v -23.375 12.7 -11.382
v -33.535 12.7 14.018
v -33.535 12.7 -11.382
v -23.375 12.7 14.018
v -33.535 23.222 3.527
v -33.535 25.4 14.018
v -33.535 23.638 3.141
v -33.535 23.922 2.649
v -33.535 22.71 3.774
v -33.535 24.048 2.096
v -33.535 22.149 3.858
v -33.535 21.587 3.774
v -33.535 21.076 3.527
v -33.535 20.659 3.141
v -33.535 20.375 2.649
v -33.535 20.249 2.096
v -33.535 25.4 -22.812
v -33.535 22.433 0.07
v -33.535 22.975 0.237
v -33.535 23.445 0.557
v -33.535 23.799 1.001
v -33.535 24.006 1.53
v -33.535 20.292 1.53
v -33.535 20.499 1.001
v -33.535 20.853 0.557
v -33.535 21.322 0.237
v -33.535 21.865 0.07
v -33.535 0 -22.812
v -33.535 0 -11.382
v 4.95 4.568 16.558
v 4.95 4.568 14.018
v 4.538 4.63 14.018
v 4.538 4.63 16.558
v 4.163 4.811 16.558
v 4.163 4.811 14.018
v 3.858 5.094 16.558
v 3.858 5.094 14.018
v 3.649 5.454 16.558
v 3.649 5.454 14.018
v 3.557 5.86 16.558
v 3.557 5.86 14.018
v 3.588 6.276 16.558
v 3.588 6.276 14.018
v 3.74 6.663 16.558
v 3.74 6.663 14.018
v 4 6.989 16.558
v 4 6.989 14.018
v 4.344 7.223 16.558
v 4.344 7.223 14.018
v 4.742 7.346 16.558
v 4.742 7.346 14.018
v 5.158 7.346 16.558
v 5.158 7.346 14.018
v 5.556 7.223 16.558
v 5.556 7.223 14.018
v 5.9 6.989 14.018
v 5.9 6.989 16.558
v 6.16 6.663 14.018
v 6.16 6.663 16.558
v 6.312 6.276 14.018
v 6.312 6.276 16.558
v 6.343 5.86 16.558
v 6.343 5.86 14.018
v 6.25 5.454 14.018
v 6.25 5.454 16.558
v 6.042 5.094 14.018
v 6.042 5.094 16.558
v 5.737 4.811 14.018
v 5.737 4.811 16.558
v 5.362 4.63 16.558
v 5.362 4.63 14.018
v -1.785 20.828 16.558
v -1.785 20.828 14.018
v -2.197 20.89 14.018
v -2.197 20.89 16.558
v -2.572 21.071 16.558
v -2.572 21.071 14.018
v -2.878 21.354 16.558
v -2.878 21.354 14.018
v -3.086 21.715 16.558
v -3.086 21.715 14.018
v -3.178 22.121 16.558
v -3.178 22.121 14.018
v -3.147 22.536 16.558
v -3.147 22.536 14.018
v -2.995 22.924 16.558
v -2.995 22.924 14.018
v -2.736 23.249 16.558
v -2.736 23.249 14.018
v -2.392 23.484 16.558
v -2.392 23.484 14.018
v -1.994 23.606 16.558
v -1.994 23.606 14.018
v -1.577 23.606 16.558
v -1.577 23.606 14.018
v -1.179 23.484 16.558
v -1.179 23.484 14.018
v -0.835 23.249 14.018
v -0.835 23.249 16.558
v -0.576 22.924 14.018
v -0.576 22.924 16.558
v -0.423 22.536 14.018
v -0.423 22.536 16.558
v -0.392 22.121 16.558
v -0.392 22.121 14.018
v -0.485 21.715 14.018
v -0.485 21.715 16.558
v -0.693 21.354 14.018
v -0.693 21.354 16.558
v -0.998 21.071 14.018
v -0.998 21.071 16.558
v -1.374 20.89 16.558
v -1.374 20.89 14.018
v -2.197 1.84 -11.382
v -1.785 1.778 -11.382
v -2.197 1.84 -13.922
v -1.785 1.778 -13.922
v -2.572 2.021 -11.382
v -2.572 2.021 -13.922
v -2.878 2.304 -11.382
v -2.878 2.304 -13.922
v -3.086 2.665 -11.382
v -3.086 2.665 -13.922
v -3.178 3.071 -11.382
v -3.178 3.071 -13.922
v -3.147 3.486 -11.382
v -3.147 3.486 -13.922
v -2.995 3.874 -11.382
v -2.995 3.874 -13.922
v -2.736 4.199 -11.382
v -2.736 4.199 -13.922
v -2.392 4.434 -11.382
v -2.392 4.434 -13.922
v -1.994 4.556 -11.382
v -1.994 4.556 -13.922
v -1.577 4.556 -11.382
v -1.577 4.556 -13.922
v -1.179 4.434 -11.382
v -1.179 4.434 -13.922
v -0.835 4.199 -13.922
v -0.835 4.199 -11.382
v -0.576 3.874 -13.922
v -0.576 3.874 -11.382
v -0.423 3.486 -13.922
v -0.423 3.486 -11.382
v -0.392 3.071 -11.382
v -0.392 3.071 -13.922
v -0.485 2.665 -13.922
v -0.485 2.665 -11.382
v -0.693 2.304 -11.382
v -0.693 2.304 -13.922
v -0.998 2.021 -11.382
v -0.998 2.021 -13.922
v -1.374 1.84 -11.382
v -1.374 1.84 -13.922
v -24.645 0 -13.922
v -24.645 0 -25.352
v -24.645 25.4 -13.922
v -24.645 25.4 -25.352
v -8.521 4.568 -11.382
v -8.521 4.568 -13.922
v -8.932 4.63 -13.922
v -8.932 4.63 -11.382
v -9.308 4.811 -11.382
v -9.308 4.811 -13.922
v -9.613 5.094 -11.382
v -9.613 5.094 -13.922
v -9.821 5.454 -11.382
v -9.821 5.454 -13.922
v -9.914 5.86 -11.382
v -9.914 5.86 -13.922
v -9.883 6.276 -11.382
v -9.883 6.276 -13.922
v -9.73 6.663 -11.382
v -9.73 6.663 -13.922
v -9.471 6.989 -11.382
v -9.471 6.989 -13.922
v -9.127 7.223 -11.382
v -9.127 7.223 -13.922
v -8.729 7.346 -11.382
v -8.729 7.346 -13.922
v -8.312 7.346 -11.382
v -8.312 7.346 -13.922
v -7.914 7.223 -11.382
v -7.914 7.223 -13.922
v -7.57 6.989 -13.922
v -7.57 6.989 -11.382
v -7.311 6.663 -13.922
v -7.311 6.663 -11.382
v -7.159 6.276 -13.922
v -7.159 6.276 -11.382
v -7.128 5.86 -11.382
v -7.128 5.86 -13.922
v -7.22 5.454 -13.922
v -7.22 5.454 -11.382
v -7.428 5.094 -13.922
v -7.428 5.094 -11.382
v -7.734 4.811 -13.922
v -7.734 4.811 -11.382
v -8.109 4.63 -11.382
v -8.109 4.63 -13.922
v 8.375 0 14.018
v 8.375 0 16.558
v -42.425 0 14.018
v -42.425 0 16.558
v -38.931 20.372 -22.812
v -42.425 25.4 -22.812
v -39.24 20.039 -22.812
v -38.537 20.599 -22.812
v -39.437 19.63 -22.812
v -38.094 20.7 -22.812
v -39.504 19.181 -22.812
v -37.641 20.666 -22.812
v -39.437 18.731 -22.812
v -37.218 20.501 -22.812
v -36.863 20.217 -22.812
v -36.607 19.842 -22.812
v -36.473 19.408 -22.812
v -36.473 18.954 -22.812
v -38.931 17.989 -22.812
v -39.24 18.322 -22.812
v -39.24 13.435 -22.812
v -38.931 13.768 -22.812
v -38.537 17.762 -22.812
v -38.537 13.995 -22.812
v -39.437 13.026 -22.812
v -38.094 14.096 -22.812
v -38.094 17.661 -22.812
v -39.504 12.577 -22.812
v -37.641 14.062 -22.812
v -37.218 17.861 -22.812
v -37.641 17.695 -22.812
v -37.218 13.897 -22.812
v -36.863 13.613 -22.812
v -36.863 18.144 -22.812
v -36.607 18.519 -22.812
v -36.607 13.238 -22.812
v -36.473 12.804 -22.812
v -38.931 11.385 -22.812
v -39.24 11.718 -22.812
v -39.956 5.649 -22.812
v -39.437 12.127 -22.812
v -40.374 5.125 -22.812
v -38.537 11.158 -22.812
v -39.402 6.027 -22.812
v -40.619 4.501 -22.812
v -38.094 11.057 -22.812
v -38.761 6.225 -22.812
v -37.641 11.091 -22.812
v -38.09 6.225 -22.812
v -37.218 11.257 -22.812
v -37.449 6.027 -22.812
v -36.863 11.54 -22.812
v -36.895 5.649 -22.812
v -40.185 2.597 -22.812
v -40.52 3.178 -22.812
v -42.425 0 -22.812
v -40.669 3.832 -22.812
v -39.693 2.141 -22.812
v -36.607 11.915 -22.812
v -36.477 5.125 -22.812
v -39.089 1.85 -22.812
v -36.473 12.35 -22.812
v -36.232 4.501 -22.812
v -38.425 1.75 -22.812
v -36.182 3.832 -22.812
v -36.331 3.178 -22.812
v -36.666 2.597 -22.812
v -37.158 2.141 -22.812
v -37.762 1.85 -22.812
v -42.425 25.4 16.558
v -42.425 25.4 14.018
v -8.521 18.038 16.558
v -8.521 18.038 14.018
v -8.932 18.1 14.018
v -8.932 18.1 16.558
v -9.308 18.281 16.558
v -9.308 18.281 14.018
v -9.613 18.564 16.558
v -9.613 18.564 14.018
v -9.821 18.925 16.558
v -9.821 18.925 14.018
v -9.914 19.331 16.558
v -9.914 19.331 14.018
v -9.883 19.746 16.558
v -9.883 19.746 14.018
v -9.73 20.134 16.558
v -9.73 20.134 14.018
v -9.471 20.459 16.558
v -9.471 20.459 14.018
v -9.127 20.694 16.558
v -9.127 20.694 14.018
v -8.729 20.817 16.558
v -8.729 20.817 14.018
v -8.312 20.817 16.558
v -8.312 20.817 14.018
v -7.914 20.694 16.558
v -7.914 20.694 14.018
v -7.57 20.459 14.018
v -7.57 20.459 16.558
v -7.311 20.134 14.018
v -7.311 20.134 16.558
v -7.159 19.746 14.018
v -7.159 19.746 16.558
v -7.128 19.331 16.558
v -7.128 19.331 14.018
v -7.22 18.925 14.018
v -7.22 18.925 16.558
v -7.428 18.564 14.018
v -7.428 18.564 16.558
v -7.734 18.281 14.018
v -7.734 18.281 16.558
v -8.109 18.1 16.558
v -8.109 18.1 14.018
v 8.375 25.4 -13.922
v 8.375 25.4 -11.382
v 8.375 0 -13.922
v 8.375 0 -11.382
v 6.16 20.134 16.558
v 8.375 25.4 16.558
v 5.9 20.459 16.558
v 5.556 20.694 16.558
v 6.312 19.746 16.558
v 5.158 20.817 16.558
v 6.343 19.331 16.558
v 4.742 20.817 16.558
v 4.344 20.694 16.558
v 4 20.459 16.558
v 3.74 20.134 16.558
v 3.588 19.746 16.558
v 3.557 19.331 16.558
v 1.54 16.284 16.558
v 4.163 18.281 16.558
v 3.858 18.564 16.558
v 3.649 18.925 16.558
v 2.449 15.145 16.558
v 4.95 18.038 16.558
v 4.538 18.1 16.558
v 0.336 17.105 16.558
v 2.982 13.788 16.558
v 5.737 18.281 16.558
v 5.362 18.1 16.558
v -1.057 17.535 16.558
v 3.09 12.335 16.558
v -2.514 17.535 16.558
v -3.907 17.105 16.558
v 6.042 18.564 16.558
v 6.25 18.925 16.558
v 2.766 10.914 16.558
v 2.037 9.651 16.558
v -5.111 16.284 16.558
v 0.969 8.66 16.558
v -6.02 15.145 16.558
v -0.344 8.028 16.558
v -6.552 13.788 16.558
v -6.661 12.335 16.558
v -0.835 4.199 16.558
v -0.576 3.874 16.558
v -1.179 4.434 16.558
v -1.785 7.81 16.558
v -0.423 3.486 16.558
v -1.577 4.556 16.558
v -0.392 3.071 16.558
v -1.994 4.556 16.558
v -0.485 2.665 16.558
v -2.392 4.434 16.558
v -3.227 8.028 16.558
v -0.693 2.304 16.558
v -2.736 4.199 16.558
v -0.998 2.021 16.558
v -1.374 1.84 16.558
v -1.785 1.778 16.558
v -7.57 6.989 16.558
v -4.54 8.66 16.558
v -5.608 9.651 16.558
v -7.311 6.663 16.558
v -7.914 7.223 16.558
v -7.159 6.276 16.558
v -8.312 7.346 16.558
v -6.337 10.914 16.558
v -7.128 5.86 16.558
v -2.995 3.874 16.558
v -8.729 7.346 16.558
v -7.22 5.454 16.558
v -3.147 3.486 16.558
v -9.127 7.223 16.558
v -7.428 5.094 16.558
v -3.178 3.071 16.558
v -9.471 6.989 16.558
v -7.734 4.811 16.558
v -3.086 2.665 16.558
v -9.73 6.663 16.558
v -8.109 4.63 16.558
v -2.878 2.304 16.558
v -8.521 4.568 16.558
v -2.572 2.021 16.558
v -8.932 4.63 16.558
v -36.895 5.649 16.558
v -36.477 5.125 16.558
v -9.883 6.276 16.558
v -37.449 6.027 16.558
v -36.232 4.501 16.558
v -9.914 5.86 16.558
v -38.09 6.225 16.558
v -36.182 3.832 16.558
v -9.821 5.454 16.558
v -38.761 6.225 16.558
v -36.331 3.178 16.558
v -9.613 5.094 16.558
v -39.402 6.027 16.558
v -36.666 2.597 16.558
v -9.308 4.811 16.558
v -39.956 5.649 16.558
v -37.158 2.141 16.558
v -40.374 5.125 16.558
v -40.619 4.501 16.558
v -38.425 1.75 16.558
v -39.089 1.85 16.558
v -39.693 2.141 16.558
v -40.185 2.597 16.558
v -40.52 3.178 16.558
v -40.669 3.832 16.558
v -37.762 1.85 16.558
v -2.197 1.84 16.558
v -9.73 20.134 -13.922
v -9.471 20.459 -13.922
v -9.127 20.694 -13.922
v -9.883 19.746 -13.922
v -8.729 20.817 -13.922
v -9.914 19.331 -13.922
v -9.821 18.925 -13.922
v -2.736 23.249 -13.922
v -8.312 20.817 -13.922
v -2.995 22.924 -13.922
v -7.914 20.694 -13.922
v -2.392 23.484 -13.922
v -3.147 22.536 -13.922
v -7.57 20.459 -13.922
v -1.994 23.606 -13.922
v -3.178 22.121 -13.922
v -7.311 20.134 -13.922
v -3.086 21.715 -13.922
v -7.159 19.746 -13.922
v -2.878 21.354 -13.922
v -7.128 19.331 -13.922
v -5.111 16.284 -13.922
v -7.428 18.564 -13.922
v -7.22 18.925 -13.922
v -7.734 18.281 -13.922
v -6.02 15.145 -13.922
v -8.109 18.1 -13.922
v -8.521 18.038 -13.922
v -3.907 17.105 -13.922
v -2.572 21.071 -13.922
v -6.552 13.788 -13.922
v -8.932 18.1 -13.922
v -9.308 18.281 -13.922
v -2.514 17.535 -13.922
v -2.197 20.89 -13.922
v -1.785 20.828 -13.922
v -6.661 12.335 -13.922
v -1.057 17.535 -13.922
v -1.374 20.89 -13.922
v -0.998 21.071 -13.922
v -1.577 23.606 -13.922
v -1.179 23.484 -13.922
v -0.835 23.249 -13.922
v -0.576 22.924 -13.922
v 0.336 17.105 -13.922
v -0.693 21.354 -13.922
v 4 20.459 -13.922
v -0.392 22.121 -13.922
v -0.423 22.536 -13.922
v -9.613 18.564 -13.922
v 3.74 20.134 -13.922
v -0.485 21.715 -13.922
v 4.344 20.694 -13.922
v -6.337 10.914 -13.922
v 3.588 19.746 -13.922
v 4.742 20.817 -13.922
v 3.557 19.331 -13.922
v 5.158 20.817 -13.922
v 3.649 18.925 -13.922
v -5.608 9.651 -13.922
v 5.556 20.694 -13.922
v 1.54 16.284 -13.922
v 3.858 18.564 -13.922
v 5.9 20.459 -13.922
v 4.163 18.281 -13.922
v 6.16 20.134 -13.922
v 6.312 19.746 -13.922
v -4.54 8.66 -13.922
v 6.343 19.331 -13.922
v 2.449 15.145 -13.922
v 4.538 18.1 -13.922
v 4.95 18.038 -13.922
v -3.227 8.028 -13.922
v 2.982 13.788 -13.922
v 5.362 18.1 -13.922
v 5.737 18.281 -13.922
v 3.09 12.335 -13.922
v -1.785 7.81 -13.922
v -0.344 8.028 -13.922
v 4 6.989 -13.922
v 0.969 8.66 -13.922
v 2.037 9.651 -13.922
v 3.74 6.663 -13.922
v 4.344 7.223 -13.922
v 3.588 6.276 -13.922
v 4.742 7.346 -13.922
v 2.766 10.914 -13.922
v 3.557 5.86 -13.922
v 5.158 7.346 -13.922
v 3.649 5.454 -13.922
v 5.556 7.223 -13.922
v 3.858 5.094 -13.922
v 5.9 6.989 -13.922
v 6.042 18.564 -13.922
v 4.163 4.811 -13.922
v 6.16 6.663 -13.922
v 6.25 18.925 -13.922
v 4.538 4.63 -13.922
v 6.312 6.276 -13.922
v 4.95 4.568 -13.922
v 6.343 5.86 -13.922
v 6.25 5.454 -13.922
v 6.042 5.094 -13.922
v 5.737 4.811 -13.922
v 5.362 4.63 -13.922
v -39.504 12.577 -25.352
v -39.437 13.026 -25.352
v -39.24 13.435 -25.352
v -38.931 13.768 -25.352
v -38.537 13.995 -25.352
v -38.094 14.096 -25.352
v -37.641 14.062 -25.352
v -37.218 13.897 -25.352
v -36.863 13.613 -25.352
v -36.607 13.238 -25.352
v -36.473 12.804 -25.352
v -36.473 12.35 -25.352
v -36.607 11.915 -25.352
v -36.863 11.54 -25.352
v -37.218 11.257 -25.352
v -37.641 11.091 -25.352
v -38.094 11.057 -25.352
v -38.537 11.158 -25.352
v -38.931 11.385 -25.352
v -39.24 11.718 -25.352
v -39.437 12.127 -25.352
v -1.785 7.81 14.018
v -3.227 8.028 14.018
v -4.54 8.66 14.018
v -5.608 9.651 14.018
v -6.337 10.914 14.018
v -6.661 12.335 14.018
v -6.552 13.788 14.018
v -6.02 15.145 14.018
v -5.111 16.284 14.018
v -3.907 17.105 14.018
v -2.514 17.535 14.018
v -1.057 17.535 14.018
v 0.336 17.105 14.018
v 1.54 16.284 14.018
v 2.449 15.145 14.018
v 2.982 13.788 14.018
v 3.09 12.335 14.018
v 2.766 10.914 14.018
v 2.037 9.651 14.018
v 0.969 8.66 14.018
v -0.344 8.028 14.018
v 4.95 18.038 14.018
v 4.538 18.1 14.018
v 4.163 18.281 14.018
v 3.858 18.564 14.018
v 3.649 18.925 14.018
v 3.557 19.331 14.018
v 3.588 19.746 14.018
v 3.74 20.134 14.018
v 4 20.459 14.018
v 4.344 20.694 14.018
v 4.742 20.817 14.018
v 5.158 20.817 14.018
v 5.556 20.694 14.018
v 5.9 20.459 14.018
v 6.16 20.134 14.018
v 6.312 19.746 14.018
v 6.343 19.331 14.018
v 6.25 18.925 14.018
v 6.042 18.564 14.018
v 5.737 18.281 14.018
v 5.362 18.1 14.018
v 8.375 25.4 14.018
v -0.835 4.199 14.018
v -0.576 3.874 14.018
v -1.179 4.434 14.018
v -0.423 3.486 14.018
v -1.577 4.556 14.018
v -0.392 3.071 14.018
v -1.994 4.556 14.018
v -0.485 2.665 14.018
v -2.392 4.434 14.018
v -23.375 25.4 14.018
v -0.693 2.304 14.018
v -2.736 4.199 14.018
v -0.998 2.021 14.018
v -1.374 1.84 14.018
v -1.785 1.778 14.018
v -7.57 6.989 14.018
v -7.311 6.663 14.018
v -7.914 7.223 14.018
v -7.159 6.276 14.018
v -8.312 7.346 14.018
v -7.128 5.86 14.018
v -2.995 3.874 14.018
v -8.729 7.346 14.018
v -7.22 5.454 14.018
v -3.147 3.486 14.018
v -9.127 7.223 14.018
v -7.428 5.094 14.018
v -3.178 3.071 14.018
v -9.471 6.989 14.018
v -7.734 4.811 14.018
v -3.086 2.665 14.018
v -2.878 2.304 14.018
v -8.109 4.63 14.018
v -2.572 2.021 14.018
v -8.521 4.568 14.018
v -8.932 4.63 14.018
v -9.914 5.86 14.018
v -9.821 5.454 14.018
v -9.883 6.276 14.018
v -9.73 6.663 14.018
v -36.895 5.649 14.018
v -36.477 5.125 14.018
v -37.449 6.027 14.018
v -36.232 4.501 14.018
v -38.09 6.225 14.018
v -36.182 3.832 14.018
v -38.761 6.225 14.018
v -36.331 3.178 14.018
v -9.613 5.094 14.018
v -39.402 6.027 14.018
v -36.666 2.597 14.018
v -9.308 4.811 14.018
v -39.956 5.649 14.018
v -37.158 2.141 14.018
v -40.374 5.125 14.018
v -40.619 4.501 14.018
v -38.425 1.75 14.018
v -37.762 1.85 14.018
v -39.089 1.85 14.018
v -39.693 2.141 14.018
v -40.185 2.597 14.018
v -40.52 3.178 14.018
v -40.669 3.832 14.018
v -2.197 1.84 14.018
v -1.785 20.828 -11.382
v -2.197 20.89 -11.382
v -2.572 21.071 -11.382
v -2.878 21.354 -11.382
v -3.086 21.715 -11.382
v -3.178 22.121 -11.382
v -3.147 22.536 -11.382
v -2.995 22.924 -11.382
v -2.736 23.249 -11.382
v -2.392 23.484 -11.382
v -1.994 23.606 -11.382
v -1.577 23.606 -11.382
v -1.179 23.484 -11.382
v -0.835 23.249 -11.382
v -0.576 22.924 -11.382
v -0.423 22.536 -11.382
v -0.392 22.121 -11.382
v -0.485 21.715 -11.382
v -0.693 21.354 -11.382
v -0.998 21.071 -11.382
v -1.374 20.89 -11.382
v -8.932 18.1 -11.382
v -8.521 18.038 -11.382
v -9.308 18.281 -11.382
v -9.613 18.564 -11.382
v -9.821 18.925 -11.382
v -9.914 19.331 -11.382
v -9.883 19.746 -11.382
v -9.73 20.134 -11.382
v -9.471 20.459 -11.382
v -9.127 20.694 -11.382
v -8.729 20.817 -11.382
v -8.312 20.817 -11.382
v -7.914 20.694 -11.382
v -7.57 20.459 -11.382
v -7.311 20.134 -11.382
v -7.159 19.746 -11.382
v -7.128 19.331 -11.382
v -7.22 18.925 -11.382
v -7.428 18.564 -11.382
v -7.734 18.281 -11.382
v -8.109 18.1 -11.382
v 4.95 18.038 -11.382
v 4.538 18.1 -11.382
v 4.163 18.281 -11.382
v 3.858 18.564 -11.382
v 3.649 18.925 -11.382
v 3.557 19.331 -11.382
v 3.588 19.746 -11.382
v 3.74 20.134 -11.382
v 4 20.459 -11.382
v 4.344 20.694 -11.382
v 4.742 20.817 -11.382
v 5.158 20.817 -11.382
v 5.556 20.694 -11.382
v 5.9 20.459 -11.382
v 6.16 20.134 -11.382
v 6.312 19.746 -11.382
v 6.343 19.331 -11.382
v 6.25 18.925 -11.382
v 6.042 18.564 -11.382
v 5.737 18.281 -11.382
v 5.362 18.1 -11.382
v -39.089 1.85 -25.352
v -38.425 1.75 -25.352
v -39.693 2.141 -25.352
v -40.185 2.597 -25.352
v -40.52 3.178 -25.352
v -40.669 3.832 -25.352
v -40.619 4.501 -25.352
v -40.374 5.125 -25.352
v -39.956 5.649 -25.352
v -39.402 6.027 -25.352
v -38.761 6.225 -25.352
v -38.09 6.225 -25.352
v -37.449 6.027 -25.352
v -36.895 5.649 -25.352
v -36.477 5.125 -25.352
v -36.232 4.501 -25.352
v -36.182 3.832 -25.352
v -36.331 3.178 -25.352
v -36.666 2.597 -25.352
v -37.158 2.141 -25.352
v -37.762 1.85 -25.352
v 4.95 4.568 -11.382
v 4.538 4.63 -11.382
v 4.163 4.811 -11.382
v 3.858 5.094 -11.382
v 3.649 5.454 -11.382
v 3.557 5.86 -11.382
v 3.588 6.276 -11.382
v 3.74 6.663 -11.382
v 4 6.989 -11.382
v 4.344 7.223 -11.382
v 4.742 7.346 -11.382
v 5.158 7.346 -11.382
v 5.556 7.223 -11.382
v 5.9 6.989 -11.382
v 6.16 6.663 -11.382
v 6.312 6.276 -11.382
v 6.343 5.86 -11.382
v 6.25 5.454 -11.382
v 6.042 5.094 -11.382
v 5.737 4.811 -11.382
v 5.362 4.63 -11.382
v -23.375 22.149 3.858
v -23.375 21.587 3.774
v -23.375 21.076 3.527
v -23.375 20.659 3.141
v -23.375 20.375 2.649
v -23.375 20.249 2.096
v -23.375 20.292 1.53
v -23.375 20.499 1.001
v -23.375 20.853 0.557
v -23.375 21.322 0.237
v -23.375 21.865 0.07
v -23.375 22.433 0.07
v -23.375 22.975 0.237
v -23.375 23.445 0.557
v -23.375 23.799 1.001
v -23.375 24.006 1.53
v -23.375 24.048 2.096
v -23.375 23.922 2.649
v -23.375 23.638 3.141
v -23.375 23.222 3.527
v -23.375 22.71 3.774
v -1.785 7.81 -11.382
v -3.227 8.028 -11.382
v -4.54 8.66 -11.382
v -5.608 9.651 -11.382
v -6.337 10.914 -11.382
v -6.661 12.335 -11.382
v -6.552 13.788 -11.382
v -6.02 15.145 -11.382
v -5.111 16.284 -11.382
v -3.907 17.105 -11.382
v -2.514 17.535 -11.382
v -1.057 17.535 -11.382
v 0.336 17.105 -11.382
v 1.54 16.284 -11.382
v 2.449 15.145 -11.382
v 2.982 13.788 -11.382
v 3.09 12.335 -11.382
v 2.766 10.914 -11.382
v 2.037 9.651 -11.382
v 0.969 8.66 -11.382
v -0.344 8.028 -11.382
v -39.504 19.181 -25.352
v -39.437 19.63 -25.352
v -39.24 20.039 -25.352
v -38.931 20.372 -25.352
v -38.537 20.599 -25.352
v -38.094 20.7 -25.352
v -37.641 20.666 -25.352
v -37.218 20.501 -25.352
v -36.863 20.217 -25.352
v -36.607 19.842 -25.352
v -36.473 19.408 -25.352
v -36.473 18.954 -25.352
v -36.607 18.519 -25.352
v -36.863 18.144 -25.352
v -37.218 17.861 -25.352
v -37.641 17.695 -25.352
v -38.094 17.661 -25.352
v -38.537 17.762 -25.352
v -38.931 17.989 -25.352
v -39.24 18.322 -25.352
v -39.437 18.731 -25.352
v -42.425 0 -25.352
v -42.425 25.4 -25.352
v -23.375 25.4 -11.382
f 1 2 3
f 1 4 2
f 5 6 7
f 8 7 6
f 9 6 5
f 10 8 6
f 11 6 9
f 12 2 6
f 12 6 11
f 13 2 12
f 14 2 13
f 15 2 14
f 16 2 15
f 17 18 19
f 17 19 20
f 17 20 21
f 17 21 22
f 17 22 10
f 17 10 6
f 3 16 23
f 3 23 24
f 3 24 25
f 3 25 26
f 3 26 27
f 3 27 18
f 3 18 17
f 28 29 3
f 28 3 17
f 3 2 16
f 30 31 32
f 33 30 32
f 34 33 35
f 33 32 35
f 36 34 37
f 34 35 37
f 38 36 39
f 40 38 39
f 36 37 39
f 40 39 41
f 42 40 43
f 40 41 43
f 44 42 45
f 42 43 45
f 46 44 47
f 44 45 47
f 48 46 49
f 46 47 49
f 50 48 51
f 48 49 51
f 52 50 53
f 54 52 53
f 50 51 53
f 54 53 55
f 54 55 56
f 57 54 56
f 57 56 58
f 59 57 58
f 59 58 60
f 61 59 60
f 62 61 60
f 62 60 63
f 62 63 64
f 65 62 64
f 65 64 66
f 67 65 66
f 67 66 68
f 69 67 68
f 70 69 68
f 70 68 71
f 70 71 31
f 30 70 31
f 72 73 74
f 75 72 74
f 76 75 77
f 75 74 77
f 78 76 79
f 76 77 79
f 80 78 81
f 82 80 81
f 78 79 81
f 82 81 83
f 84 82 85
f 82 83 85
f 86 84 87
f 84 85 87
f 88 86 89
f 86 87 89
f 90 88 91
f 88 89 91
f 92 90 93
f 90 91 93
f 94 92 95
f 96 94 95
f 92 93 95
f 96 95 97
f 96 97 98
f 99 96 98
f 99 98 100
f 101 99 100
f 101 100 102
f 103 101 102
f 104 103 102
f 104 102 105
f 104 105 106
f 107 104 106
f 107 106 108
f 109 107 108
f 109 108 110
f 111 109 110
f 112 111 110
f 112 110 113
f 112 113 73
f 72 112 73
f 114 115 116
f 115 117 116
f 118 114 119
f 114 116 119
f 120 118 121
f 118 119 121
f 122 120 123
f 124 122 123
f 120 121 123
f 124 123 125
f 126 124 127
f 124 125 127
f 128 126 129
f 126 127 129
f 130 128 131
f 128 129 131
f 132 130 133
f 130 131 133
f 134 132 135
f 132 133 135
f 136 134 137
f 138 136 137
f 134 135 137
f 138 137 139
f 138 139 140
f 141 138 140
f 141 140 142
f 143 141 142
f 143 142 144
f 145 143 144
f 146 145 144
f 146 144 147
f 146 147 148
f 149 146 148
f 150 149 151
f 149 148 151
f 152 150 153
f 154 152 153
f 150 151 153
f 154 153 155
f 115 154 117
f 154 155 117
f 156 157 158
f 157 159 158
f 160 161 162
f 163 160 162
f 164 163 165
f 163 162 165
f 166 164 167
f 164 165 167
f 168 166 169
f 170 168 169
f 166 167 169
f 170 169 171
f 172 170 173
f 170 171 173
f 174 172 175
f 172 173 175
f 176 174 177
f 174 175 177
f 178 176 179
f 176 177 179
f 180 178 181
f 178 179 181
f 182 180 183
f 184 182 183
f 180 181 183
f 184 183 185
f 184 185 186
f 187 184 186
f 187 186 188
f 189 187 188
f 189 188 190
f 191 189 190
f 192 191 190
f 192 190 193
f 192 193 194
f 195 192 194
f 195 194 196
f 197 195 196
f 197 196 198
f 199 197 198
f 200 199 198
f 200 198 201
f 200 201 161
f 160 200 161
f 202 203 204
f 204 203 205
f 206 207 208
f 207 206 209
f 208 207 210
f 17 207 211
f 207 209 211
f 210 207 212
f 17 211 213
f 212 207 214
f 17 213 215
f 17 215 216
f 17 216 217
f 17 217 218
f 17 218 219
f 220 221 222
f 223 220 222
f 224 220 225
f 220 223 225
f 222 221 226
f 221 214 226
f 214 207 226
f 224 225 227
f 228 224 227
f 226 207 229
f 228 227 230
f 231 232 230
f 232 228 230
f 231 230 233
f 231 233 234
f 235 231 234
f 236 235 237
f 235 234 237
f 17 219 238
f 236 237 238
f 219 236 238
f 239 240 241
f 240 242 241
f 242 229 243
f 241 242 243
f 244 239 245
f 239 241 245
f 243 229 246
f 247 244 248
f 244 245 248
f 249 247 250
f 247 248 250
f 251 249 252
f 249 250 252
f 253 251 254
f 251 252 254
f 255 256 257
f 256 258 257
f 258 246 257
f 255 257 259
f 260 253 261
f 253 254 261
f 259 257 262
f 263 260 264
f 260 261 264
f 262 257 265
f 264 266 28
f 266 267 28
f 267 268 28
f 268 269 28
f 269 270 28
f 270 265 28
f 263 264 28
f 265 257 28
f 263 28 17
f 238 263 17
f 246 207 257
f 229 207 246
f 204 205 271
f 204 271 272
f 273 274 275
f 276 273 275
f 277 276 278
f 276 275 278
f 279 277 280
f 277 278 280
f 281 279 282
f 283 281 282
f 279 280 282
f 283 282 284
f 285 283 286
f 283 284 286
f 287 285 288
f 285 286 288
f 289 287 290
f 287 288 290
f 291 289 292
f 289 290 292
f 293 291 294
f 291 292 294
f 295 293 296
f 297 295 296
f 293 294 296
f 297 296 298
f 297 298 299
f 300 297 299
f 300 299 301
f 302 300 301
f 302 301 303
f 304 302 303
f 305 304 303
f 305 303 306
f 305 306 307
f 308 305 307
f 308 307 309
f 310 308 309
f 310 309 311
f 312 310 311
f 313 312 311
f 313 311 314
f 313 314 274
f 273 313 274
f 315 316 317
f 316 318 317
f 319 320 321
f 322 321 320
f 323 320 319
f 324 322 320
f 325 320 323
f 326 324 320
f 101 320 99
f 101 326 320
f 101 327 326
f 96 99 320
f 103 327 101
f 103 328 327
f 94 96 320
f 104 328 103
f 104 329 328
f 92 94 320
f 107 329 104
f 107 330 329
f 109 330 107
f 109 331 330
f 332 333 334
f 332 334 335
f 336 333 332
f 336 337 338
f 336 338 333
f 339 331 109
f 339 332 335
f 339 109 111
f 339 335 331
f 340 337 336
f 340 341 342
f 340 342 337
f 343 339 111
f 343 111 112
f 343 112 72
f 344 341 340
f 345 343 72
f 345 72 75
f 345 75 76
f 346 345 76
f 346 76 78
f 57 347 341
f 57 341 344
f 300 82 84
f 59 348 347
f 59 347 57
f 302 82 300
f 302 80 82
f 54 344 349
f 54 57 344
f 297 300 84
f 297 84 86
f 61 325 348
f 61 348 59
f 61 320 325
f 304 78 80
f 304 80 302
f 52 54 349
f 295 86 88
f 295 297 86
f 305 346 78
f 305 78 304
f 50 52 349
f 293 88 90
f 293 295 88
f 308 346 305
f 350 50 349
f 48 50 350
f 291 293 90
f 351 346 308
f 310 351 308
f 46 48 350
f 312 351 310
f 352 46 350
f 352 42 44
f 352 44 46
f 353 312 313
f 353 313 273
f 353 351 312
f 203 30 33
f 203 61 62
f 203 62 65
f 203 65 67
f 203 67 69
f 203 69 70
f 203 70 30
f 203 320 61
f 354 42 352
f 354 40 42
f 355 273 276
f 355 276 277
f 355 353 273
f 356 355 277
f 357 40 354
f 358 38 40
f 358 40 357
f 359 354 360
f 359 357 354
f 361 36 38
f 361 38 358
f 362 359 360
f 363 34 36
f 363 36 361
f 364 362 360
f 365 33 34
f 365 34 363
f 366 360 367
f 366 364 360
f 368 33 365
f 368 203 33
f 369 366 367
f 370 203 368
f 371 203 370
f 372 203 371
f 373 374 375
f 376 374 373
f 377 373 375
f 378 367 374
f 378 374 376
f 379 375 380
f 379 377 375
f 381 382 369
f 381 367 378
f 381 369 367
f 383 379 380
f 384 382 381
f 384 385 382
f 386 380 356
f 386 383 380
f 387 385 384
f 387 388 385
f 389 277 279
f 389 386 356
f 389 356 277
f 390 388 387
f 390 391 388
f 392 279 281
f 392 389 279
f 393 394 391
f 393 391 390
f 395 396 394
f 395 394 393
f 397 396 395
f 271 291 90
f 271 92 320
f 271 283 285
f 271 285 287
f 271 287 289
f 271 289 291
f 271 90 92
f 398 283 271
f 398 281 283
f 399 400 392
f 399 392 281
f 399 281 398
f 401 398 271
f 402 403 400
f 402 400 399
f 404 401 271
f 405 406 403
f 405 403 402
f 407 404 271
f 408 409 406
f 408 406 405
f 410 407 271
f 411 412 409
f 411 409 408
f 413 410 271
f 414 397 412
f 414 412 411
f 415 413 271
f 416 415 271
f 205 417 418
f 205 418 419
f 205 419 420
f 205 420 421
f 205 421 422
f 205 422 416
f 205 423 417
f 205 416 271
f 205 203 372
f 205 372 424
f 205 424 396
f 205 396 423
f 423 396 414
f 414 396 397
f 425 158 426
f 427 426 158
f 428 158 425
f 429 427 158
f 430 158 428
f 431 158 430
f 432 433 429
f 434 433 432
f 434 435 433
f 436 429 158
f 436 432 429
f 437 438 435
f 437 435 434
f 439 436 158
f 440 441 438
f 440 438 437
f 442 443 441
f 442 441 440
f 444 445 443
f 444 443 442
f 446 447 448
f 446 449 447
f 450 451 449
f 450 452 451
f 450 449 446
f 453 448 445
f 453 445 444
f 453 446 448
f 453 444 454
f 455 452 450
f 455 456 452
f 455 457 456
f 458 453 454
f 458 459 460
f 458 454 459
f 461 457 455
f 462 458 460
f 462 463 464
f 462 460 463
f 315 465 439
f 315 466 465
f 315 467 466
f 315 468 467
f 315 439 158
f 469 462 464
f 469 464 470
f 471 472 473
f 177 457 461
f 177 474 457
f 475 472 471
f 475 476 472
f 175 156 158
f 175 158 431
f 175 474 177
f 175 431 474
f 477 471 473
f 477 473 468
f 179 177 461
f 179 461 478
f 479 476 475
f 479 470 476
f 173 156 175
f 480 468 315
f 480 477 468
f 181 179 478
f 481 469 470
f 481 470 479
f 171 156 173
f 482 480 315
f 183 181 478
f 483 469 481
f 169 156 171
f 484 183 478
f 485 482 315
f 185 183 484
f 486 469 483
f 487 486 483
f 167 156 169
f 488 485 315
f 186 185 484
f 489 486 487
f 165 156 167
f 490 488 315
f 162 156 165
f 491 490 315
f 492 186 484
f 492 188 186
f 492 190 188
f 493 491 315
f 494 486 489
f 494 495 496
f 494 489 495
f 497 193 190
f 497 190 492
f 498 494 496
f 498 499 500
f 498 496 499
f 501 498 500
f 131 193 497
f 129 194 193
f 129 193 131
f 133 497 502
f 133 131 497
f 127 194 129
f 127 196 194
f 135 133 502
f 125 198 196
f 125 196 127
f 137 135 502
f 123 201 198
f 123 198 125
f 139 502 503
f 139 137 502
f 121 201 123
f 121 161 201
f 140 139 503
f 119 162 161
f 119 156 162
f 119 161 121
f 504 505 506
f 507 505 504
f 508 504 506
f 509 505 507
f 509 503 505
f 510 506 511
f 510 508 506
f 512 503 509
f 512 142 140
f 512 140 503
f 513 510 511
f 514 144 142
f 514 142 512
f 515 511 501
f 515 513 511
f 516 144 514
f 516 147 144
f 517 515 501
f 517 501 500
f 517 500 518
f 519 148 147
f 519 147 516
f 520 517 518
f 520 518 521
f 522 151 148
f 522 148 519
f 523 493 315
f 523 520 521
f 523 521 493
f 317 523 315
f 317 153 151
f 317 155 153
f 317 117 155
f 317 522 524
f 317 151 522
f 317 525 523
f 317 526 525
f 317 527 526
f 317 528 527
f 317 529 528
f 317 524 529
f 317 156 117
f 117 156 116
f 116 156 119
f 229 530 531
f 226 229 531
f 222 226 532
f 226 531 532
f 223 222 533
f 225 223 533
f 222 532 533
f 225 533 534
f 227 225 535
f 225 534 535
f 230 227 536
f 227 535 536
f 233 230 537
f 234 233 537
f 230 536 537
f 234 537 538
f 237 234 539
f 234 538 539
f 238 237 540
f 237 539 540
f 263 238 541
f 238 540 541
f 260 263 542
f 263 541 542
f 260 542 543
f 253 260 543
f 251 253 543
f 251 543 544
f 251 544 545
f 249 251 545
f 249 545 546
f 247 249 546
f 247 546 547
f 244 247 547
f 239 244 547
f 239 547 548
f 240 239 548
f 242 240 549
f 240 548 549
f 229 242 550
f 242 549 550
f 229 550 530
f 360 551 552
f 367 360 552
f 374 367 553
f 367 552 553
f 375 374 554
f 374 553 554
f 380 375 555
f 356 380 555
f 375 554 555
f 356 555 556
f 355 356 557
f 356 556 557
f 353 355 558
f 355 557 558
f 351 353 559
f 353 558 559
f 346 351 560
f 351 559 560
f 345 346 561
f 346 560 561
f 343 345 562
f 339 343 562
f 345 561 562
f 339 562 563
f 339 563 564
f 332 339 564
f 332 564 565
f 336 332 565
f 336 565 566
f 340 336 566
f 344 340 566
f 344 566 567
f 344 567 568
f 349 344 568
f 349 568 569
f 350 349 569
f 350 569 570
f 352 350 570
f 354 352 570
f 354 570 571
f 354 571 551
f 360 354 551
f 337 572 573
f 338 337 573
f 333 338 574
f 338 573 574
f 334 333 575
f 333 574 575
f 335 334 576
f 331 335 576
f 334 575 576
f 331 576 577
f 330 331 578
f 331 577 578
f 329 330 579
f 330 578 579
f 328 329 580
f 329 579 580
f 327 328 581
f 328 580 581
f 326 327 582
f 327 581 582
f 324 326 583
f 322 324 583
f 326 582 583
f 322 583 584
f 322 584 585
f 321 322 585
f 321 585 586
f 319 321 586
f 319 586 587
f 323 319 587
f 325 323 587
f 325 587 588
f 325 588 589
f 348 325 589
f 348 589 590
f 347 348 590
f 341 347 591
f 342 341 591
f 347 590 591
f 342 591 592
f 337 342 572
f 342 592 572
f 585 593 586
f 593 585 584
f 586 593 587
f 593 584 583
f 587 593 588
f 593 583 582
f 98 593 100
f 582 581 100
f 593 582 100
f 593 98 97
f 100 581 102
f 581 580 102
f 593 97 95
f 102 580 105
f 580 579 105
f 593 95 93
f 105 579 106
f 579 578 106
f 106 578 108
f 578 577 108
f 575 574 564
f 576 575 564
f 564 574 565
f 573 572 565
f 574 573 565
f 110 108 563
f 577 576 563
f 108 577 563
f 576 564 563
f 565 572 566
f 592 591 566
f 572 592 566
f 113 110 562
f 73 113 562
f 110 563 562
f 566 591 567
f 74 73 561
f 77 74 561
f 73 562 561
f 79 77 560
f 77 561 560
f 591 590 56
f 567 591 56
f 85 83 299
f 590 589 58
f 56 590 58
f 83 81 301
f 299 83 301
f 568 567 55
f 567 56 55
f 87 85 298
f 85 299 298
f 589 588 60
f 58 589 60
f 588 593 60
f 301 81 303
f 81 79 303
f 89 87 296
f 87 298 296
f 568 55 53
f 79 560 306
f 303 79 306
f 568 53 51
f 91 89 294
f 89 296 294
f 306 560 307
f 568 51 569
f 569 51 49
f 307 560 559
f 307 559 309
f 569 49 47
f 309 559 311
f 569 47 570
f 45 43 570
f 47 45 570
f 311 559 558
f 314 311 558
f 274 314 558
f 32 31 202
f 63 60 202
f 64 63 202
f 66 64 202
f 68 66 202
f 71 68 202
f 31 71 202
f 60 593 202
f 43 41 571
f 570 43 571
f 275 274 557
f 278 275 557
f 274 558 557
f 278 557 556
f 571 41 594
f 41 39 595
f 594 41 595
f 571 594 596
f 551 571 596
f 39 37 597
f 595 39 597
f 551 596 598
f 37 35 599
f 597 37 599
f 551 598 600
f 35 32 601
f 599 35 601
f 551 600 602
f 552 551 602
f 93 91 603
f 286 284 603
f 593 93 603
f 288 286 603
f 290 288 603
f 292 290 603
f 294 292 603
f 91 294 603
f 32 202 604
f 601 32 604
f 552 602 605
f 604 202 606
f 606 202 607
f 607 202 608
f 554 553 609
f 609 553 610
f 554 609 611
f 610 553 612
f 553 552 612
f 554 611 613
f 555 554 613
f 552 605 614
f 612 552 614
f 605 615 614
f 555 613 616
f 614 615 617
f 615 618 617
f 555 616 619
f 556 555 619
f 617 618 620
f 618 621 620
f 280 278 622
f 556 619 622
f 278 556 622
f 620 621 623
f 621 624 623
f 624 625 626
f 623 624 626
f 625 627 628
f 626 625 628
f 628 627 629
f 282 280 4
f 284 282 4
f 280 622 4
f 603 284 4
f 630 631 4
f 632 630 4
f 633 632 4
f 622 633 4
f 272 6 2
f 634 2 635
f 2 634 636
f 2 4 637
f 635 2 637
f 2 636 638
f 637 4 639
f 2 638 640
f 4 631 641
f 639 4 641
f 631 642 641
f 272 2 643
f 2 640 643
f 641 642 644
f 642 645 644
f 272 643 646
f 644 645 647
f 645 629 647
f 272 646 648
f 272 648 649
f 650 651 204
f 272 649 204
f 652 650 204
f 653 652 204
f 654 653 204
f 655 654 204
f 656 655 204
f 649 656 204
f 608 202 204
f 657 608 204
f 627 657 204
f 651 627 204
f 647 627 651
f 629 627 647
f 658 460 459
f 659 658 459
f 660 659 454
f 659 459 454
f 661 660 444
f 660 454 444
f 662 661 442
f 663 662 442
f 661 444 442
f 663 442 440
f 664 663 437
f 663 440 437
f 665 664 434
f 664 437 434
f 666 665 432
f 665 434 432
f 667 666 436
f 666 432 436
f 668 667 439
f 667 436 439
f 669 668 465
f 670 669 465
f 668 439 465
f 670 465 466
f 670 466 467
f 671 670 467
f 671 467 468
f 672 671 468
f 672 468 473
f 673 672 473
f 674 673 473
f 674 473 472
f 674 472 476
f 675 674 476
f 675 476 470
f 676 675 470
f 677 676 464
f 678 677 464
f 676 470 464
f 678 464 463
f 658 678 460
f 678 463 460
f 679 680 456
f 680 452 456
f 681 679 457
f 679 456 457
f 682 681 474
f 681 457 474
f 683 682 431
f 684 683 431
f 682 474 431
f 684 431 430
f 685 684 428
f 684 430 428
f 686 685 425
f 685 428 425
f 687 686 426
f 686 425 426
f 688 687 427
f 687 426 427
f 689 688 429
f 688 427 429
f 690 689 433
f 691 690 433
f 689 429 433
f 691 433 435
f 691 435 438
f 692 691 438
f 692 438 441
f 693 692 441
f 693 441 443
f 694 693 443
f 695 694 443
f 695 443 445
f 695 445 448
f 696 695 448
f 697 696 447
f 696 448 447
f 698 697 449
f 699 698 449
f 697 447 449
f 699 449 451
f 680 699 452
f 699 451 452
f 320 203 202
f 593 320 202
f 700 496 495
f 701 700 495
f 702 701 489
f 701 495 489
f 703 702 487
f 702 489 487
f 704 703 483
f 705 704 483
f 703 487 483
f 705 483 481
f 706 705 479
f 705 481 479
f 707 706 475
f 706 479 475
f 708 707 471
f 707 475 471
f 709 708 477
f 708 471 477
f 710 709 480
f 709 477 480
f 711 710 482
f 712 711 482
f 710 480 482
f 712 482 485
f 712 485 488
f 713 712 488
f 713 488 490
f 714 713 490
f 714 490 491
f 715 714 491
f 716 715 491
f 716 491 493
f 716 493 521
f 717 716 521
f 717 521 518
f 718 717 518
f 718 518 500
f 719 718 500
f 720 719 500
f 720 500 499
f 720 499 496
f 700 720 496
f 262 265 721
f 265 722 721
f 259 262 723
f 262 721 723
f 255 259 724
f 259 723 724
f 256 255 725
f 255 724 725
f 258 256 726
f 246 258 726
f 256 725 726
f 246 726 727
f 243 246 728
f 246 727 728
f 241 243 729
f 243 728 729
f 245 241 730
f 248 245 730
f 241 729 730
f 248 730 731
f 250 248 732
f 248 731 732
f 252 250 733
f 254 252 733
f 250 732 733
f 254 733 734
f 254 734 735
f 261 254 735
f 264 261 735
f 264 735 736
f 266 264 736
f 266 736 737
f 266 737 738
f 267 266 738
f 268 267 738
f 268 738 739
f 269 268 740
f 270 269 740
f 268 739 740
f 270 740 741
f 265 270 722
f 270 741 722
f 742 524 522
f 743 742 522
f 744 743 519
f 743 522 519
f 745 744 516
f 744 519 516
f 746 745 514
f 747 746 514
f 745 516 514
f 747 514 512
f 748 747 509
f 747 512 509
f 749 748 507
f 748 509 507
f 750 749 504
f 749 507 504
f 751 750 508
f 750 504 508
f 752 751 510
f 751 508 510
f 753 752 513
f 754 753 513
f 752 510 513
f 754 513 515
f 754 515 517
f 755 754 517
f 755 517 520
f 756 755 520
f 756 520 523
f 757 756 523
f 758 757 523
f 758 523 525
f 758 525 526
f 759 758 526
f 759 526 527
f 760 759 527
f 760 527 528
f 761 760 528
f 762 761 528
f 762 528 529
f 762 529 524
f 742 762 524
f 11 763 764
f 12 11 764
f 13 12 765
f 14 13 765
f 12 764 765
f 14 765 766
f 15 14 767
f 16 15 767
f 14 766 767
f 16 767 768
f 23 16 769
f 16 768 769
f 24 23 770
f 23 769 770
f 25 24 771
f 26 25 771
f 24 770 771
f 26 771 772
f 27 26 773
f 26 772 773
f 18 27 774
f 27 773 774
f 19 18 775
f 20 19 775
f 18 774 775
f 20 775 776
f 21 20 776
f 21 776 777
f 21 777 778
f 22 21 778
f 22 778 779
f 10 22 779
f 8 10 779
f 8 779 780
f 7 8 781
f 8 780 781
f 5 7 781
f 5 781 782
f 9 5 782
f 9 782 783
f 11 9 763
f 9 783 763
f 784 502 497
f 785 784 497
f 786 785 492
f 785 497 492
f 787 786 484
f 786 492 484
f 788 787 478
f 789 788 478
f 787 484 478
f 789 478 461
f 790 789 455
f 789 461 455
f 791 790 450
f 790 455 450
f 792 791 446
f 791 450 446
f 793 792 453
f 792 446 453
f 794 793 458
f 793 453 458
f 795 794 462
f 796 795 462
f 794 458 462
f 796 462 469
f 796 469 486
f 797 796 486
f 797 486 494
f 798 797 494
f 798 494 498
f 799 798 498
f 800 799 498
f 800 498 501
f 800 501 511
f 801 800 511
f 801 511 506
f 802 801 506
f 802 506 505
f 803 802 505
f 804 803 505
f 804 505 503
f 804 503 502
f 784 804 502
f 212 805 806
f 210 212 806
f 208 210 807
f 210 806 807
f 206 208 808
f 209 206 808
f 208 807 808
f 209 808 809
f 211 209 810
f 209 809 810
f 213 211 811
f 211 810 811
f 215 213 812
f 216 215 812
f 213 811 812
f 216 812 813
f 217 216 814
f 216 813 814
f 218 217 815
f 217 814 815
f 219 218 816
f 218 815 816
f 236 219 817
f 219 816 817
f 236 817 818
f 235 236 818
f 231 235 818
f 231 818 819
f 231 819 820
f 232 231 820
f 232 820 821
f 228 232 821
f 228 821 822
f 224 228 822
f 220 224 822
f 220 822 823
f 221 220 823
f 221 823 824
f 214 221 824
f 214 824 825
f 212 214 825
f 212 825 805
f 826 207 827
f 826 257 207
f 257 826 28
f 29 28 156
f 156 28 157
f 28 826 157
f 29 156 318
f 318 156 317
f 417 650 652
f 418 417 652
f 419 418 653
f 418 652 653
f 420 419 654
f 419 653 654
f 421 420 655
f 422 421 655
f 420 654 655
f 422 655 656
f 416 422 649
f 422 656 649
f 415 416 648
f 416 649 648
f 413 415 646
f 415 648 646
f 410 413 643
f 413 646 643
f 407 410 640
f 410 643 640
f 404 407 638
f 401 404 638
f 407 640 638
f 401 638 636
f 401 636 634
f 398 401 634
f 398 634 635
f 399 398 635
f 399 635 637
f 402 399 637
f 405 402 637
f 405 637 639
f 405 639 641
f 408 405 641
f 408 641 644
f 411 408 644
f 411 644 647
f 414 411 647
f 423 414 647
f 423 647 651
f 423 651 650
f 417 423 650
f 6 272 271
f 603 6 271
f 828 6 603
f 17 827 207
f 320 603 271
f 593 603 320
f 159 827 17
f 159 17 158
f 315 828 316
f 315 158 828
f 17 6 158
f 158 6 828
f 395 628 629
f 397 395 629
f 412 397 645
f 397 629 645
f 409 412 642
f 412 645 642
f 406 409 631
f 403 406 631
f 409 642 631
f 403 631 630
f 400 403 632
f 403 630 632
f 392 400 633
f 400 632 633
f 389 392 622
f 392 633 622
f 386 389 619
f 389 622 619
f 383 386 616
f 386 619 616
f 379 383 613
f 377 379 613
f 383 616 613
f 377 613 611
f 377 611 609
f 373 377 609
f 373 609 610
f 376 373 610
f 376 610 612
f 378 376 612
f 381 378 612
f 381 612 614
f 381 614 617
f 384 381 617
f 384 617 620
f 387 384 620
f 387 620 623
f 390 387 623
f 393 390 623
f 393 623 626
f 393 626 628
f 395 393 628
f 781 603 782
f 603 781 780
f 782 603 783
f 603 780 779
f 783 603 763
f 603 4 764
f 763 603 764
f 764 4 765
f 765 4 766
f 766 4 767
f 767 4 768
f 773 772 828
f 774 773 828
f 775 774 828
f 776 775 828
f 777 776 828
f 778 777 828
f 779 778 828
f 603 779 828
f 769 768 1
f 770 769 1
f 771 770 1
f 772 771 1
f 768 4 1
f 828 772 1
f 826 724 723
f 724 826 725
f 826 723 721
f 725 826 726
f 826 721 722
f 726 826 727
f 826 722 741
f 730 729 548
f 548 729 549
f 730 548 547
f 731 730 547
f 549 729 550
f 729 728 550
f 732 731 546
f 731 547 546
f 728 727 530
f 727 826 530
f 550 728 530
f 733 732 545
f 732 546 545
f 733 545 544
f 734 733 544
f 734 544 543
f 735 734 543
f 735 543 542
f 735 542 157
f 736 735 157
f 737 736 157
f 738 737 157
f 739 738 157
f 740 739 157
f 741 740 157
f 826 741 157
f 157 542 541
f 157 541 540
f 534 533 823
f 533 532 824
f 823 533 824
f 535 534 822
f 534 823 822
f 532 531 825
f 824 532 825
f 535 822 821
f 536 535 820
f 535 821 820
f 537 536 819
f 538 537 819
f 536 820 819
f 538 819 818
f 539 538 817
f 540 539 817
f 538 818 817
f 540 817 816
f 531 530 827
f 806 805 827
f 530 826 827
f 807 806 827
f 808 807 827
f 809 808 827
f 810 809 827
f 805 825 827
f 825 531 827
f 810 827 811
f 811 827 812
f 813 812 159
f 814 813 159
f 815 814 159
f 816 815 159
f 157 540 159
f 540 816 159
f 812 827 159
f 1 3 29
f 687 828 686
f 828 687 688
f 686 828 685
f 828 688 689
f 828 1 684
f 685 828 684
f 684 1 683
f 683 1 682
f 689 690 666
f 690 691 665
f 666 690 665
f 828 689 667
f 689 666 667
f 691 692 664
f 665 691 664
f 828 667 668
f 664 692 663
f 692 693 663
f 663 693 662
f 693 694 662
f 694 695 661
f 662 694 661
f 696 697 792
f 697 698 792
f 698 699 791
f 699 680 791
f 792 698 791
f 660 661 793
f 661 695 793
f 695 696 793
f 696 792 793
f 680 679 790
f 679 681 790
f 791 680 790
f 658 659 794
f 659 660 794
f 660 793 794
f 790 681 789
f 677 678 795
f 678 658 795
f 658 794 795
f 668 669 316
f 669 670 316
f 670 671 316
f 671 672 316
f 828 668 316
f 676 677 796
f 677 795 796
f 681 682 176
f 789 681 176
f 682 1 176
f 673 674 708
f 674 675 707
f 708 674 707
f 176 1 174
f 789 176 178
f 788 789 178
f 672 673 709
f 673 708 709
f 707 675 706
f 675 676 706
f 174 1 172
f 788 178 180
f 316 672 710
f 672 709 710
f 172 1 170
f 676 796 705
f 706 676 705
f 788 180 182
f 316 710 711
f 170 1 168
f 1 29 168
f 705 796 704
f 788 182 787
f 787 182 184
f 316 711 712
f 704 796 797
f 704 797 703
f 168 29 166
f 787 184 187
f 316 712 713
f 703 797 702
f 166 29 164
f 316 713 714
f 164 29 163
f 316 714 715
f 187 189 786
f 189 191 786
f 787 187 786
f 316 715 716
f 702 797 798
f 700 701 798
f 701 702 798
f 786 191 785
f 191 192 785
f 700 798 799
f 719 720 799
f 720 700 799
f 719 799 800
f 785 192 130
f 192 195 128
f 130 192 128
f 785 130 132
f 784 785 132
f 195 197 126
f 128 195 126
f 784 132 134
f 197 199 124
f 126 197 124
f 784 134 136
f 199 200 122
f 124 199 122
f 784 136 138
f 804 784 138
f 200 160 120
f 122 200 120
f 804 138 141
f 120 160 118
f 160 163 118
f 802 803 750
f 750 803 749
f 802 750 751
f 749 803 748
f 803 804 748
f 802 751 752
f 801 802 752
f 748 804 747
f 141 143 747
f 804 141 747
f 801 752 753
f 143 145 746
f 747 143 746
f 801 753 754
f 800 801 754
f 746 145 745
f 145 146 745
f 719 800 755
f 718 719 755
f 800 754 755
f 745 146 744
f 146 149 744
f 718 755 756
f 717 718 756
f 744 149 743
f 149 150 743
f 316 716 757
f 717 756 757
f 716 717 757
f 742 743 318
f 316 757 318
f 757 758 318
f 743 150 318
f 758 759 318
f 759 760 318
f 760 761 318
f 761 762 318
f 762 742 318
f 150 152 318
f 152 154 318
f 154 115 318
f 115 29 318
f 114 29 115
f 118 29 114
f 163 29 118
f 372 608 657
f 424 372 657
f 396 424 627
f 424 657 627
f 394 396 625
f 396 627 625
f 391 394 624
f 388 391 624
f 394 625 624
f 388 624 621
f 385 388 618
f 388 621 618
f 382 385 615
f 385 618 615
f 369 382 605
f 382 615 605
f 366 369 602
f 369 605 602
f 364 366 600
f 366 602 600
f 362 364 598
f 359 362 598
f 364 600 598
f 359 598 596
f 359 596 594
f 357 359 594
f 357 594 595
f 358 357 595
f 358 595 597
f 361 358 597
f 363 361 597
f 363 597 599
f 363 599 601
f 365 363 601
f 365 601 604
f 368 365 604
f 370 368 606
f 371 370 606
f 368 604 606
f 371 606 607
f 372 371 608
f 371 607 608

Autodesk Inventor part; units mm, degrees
ref_plane "YZ Plane" through (0, 0, 0) normal (1, 0, 0) x (0, 1, 0)
ref_plane "XZ Plane" through (0, 0, 0) normal (0, 1, 0) x (-1, 0, 0)
ref_plane "XY Plane" through (0, 0, 0) normal (0, 0, 1) x (1, 0, 0)
sketch "Sketch1" plane through (0, 0, 0) normal (0, 1, 0) x (-1, 0, 0)
  line L0 (-8.3746, 16.5585) -> (42.4254, 16.5585)
  line L1 (42.4254, 16.5585) -> (42.4254, 14.0185)
  line L2 (42.4254, 14.0185) -> (33.5354, 14.0185)
  line L3 (33.5354, 14.0185) -> (33.5354, -11.3815)
  line L4 (33.5354, -11.3815) -> (42.4254, -11.3815)
  line L5 (42.4254, -11.3815) -> (42.4254, -13.9215)
  line L6 (42.4254, -13.9215) -> (-8.3746, -13.9215)
  line L7 (-8.3746, 16.5585) -> (-8.3746, 14.0185)
  line L8 (-8.3746, 14.0185) -> (23.3754, 14.0185)
  line L9 (23.3754, 14.0185) -> (23.3754, -11.3815)
  line L10 (23.3754, -11.3815) -> (-8.3746, -11.3815)
  line L11 (-8.3746, -11.3815) -> (-8.3746, -13.9215)
  point P0 (0, 0)
  dimension "d0" = 30.48
  dimension "d1" = 2.54
  dimension "d2" = 2.54
  dimension "d4" = 2.54
  dimension "d5" = 2.54
  dimension "d6" = 8.89
  dimension "d7" = 50.8
  dimension "d8" = 31.75
extrude "Extrusion1" add sketch "Sketch1" along normal blind 25.4
sketch "Sketch4" plane through (8.3746, 0, -13.9215) normal (0, 0, -1) x (-1, 0, 0)
  line L0 (50.8, 0) -> (0, 0) projected
  line L1 (50.8, 0) -> (50.8, 25.4) projected
  line L2 (0, 25.4) -> (50.8, 25.4) projected
  line L3 (50.8, 25.4) -> (41.91, 25.4)
  line L4 (41.91, 25.4) -> (41.91, 0)
  line L5 (41.91, 0) -> (50.8, 0)
  line L6 (50.8, 0) -> (50.8, 25.4)
  point P0 (8.3746, 0)
  dimension "d56" = 8.89
extrude "Extrusion3" add sketch "Sketch4" along normal blind 11.43
sketch "Sketch5" plane through (-42.4254, 0, 16.5585) normal (0, 0, 1) x (1, 0, 0)
  line L0 (50.8, 0) -> (50.8, 25.4) projected
  line L1 (50.8, 0) -> (0, 0) projected
  point P0 (40.64, 12.7)
  dimension "d11" = 10.16
  dimension "d12" = 12.7
hole "Hole1" at (-1.7854, 12.7, 16.5585) direction (0, 0, -1) diameter 9.779 end through all
sketch "Sketch6" plane through (-42.4254, 0, 16.5585) normal (0, 0, 1) x (1, 0, 0)
  line L0 (0, 0) -> (0, 25.4) projected
  line L1 (50.8, 0) -> (0, 0) projected
  point P0 (4, 4)
  dimension "d20" = 4
  dimension "d21" = 4
hole "Hole2" at (-38.4254, 4, 16.5585) direction (0, 0, -1) diameter 4.5 end through all
sketch "Sketch2" plane through (-42.4254, 0, 16.5585) normal (0, 0, 1) x (1, 0, 0)
  circle A0 centre (40.64, 12.7) radius 4.8895 projected
  line L0 (40.64, 22.225) -> (40.64, 3.175) construction
  circle A1 centre (40.64, 12.7) radius 4.8895 construction
  line L1 (40.64, 12.7) -> (33.9048, 19.4352) construction
  line L2 (40.64, 12.7) -> (33.9048, 5.9648) construction
  line L3 (40.64, 12.7) -> (47.3752, 5.9648) construction
  line L4 (40.64, 12.7) -> (47.3752, 19.4352) construction
  point P0 (42.4254, 0)
  dimension "d29" = 9.525
  dimension "d30" = 0
  dimension "d33" = 360
  dimension "d60" = 45
  dimension "d63" = 360
hole "Hole3" at (-1.7854, 3.175, 16.5585) at (-1.7854, 22.225, 16.5585) at (-8.5206, 5.9648, 16.5585) at (-8.5206, 19.4352, 16.5585) at (4.9498, 19.4352, 16.5585) at (4.9498, 5.9648, 16.5585) direction (0, 0, -1) diameter 2.794 end through all
hole "Hole4" at (-33.5354, 22.1488, 1.9535) direction (1, 0, 0) diameter 3.81 end through all
sketch "Sketch7" plane through (8.3746, 0, -25.3515) normal (0, 0, -1) x (-1, 0, 0)
  circle A0 centre (46.355, 19.1807) radius 1.524
  circle A1 centre (46.355, 12.5767) radius 1.524
  line L0 (50.8, 0) -> (50.8, 25.4) construction
  line L1 (41.91, 25.4) -> (41.91, 0) construction
  line L2 (50.8, 25.4) -> (41.91, 25.4) construction
  point P0 (8.3746, 0)
  point P1 (50.8, 3.175)
  dimension "d65" = 3.048
  dimension "d66" = 3.048
  dimension "d67" = 6.604
  dimension "d68" = 8.89
  dimension "d69" = 4.445
  dimension "d70" = 4.445
  dimension "d71" = 6.2193
extrude "Extrusion4" cut sketch "Sketch7" against normal up to surface (13.97 mm away)
ref_plane "Work Plane2" through (-23.3754, 0, 10.8435) normal (1, 0, 0) x (0, 0, -1)
sketch "Sketch8" plane through (-23.3754, 0, 10.8435) normal (1, 0, 0) x (0, 0, -1)
  line L0 (24.765, 0) -> (22.225, 0) projected
  line L1 (-3.175, 0) -> (-5.715, 0) projected
  line L2 (22.225, 0) -> (-3.175, 0)
  line L3 (-3.175, 0) -> (-3.175, 12.7)
  line L4 (-3.175, 0) -> (-3.175, 25.4) projected
  line L5 (-3.175, 12.7) -> (22.225, 12.7)
  line L6 (22.225, 0) -> (-3.175, 0) projected
  line L7 (22.225, 12.7) -> (22.225, 0)
  point P0 (10.8435, 0)
extrude "Extrusion5" cut sketch "Sketch8" against normal through all
sketch "Sketch10" plane through (0, 25.4, 0) normal (0, 1, 0) x (1, 0, 0)
  line L0 (-42.4254, 25.3515) -> (-33.5354, 25.3515) projected
  line L1 (-33.5354, 25.3515) -> (-24.6454, 25.3515)
  line L2 (-24.6454, 25.3515) -> (-24.6454, 13.9215)
  line L3 (8.3746, 13.9215) -> (-33.5354, 13.9215) projected
  line L4 (-33.5354, 13.9215) -> (-33.5354, 25.3515) projected
  line L5 (-33.5354, 13.9215) -> (-24.6454, 13.9215)
  line L6 (-33.5354, 13.9215) -> (-33.5354, 25.3515)
  point P0 (0, 0)
  dimension "d76" = 8.89
extrude "Extrusion6" add sketch "Sketch10" against normal blind 25.4
sketch "Sketch11" plane through (0, 0, 0) normal (0, -1, 0) x (1, 0, 0)
  line L0 (-42.4254, -22.8115) -> (-33.5354, -22.8115)
  line L1 (-23.3754, -11.3815) -> (-33.5354, -11.3815) projected
  line L2 (-33.5354, -22.8115) -> (-33.5354, -11.3815)
  line L3 (-42.4254, -11.3815) -> (-33.5354, -11.3815) projected
  line L4 (-33.5354, -11.3815) -> (-42.4254, -11.3815)
  line L5 (-42.4254, -11.3815) -> (-42.4254, -22.8115)
  point P0 (0, 0)
  point P1 (-42.4254, -25.3515)
  dimension "d79" = 2.54
extrude "Extrusion7" cut sketch "Sketch11" against normal through all
equation "\"d2\" = d1"
equation "\"d4\" = d1"
equation "\"d5\" = d1"
equation "\"d69\" = 0.5 * d68"
equation "\"d70\" = 0.5 * d68"
properties part number "Odometry_Holder for metal drivetrain"
